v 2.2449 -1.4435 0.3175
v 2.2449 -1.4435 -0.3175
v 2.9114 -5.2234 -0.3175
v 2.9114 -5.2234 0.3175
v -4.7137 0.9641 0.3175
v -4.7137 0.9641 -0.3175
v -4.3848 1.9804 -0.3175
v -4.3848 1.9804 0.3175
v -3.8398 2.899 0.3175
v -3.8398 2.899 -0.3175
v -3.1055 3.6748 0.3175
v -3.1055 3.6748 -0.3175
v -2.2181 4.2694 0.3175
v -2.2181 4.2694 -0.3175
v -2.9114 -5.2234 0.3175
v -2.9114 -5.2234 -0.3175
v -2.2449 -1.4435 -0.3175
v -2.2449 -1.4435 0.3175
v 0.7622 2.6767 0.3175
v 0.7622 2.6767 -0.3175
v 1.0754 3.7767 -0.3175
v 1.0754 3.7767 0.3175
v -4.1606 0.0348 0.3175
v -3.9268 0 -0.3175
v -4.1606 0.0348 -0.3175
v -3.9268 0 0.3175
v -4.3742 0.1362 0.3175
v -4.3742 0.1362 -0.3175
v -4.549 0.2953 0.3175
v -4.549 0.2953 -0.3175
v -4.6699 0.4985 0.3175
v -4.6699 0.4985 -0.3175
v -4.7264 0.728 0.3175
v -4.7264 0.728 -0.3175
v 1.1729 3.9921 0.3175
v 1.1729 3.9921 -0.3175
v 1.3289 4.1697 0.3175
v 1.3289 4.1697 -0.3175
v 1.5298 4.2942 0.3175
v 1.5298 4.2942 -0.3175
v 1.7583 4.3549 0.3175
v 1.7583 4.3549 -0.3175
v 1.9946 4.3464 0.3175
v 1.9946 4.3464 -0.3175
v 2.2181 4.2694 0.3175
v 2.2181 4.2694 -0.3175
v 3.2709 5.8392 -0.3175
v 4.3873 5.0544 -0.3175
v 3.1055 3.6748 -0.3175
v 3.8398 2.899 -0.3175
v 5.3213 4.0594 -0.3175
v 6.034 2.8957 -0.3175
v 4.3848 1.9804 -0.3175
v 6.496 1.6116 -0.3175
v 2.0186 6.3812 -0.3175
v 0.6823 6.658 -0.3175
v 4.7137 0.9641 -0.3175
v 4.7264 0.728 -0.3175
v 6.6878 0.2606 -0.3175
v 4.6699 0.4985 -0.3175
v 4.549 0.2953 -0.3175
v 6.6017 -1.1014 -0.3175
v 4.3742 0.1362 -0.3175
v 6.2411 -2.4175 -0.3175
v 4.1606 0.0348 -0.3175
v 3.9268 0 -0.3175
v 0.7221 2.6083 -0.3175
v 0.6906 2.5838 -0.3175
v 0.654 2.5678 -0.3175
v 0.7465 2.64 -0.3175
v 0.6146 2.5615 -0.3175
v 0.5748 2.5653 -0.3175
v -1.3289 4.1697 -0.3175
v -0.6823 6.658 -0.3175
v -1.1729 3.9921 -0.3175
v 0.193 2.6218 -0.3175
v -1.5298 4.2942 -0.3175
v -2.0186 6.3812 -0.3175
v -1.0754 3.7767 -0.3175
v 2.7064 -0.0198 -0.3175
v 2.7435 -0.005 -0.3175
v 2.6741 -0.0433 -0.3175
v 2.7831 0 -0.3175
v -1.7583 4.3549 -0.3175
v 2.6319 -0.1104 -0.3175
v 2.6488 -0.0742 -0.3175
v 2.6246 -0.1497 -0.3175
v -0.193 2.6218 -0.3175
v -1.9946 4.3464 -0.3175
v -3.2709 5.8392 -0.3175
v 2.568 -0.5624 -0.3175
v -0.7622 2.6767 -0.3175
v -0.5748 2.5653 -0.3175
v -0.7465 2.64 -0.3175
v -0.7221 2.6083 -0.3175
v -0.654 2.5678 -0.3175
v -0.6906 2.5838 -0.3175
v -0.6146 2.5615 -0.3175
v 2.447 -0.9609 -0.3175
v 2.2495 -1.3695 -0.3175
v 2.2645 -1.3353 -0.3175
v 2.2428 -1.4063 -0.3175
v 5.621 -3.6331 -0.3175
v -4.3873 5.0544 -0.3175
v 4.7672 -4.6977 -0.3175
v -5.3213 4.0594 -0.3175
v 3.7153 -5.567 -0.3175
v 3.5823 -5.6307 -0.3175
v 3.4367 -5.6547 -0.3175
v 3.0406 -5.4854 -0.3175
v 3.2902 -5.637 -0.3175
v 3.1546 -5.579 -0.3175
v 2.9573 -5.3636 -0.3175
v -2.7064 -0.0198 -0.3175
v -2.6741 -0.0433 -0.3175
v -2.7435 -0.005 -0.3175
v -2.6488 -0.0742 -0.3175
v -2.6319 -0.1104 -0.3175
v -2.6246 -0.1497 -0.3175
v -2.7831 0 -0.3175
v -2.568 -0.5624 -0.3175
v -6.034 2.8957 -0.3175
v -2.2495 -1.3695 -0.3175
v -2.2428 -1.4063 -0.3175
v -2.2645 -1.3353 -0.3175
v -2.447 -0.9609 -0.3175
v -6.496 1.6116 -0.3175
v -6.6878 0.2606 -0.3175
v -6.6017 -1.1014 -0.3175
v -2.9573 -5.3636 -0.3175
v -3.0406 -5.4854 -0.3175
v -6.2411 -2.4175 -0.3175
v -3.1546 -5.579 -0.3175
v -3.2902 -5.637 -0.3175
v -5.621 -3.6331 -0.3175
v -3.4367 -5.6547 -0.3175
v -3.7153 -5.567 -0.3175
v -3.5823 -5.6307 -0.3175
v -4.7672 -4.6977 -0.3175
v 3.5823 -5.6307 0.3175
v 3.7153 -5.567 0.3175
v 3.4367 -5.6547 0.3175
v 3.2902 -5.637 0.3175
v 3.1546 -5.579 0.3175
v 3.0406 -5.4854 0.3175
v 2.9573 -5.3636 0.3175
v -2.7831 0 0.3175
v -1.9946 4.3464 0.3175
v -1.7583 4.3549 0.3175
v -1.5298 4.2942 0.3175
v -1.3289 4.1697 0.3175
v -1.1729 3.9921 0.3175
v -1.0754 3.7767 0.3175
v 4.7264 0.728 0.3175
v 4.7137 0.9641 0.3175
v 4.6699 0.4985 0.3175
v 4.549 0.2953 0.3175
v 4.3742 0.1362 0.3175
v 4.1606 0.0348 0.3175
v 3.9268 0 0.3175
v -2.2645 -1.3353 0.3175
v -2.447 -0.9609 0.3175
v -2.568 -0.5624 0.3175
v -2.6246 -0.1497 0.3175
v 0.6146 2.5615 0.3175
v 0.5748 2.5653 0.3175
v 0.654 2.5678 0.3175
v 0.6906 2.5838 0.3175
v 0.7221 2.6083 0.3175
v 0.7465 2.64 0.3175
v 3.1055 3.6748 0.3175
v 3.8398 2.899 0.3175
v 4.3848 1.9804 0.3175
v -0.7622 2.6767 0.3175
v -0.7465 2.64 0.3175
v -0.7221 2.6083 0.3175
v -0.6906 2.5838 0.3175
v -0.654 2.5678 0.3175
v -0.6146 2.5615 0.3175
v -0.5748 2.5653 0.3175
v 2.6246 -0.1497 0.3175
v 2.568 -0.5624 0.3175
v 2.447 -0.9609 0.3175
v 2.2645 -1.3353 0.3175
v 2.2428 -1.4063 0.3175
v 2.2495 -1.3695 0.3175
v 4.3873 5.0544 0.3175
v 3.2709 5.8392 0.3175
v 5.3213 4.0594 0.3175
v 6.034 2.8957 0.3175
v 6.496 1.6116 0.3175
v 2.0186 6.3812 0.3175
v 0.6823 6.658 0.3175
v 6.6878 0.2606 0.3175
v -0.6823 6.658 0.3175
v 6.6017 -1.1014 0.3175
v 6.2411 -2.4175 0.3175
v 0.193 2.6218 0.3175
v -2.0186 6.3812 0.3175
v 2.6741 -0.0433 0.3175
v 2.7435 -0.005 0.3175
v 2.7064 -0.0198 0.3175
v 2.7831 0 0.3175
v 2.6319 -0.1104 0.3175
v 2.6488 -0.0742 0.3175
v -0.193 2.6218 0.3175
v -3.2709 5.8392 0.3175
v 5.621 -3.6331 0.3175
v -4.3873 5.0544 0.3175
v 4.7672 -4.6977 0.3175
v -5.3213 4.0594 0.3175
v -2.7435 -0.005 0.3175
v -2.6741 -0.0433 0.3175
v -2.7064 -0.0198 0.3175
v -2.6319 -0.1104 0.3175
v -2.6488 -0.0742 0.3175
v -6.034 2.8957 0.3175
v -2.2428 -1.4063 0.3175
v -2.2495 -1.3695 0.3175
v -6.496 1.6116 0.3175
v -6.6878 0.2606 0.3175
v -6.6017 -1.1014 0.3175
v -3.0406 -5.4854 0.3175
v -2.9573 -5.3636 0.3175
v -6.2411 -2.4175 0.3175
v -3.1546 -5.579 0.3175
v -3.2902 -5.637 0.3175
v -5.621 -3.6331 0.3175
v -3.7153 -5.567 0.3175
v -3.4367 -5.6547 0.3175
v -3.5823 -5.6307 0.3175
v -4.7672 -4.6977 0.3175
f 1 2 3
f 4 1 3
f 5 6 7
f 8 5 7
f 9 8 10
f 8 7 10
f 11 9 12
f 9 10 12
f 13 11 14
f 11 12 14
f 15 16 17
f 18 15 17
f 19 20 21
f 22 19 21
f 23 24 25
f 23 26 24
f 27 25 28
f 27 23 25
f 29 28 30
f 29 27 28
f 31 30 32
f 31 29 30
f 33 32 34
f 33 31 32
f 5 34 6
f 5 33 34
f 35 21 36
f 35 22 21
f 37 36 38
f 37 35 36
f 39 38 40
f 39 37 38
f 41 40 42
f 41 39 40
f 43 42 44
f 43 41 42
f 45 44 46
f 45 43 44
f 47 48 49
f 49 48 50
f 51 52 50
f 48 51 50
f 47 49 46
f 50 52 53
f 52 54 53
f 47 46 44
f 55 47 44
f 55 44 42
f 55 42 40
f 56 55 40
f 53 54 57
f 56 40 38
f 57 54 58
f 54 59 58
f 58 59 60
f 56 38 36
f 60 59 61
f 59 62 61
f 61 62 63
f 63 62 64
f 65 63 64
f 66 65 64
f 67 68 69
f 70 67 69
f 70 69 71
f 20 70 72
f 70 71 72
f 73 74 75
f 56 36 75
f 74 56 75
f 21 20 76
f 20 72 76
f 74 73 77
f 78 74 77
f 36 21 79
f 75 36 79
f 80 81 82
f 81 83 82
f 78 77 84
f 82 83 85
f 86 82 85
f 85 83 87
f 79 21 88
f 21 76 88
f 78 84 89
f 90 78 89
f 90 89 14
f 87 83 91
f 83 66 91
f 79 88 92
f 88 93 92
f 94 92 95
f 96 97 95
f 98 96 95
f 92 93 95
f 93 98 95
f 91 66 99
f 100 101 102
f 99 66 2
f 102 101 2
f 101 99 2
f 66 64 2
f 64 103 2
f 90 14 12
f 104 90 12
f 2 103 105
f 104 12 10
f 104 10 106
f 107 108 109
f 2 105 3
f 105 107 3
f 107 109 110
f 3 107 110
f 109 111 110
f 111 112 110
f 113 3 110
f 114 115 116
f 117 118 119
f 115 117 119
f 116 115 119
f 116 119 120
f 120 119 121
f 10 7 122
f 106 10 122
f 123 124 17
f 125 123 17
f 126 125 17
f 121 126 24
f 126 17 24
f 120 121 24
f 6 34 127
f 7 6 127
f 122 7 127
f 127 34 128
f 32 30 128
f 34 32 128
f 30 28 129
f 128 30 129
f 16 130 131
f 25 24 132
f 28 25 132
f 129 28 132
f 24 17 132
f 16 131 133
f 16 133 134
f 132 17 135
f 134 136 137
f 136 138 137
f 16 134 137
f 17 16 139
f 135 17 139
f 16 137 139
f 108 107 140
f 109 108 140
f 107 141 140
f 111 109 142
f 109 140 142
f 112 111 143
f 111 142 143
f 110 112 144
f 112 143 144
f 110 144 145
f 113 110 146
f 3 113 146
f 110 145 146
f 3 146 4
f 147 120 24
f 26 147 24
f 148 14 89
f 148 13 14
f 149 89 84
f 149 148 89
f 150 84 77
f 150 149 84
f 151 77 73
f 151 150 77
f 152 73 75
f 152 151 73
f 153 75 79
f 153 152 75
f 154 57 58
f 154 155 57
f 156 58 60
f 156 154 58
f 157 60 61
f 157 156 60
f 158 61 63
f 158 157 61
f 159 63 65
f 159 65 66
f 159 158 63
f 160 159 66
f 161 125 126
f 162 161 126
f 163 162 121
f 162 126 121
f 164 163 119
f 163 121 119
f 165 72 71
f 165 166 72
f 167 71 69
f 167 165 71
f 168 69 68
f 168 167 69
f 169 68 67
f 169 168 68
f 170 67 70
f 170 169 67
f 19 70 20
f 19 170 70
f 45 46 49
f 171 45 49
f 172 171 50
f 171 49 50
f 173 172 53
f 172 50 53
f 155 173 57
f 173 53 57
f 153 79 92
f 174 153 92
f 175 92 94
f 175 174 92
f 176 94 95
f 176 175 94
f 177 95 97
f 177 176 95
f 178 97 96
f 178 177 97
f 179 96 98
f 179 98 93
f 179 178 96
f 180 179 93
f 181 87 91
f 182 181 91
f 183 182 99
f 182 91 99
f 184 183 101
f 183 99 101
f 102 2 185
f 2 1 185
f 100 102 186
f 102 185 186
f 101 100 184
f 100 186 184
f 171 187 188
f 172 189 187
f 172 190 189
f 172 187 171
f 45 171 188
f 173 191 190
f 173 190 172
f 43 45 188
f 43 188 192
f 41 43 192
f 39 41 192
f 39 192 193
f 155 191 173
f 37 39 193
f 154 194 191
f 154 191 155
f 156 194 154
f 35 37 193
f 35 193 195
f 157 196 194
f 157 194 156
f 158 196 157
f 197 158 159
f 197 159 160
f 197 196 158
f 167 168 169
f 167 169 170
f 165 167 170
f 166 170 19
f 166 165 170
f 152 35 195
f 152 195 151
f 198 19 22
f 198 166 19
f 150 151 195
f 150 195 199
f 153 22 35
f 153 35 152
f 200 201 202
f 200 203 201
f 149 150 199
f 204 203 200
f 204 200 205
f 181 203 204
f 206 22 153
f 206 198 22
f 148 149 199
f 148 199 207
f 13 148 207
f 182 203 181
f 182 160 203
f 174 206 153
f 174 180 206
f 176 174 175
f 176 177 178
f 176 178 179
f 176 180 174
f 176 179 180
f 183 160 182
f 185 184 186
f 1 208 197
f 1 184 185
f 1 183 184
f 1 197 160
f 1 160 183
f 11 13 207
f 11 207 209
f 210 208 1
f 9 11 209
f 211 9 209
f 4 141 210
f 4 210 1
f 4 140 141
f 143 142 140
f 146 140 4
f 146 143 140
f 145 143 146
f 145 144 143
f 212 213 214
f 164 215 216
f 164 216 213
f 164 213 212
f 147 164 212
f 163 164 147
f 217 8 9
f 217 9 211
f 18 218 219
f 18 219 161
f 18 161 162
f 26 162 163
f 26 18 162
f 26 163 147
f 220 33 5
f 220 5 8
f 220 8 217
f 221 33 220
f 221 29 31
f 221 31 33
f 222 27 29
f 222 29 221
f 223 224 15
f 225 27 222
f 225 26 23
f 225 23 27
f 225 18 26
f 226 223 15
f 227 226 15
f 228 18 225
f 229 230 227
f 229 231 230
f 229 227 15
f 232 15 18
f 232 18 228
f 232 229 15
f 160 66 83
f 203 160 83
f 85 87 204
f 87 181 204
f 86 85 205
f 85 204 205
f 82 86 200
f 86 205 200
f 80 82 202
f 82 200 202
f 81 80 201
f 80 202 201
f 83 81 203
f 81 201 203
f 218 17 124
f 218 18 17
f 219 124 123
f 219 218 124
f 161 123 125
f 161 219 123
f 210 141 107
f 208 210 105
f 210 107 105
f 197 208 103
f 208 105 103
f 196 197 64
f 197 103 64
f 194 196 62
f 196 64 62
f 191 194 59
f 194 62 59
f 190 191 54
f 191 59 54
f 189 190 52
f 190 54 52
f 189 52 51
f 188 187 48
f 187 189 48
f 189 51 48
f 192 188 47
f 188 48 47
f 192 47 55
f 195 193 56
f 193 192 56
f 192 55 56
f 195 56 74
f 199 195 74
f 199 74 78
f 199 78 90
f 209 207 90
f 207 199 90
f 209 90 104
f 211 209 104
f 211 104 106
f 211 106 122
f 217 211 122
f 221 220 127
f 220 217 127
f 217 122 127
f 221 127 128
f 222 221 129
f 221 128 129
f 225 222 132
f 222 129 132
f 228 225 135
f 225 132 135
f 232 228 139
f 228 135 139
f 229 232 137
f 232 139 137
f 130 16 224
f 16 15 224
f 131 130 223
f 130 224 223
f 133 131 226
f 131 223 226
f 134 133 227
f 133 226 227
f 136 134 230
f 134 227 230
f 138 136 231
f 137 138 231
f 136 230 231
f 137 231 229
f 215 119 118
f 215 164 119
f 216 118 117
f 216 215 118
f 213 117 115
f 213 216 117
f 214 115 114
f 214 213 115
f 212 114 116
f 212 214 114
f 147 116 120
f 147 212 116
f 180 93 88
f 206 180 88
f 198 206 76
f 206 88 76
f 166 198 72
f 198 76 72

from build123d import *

# Parameters (mm, degrees)
SKETCH3_W               = 6.6929
SKETCH3_H               = 0.635
CUT_EXTRUDE1_DEPTH      = 10.470513559
CUT_EXTRUDE1_DEPTH_BACK = 10.470513559
FILLET1_R               = 0.803148
FILLET2_R               = 0.5220462
FILLET3_R               = 0.15875


with BuildPart() as part:
    # Sketch3 → Revolve1 (revolve)
    with BuildSketch(Plane(origin=(0, 0, 0), x_dir=(1, 0, 0), z_dir=(0, 1, 0))):
        with Locations((-3.34645, 0)):
            Rectangle(SKETCH3_W, SKETCH3_H)
    revolve(axis=Axis((0, 0, -0.3175), (0, 0, 1)))

    # Sketch4 → Cut-Extrude1 (cut, two sides: drawn at the far end of the back side and taken through both)
    with BuildSketch(Plane.XY.offset(-CUT_EXTRUDE1_DEPTH_BACK)):
        with BuildLine():
            Line((0.719953916, 2.528395058), (1.317615519, 4.62731363))
            ThreePointArc((1.317615519, 4.62731363), (3.839760531, 2.89903107), (4.811251613, 0))
            Line((4.811251613, 0), (2.6289, 0))
            ThreePointArc((2.6289, 0), (2.528395058, -0.719953916), (2.234565, -1.384859008))
            Line((2.234565, -1.384859008), (3.041609986, -5.961838567))
            ThreePointArc((3.041609986, -5.961838567), (0, -6.6929), (-3.041609986, -5.961838567))
            Line((-3.041609986, -5.961838567), (-2.234565, -1.384859008))
            ThreePointArc((-2.234565, -1.384859008), (-2.528395058, -0.719953916), (-2.6289, 0))
            Line((-2.6289, 0), (-4.811251613, 0))
            ThreePointArc((-4.811251613, 0), (-3.839760531, 2.89903107), (-1.317615519, 4.62731363))
            Line((-1.317615519, 4.62731363), (-0.719953916, 2.528395058))
            ThreePointArc((-0.719953916, 2.528395058), (0, 2.6289), (0.719953916, 2.528395058))
        make_face()
    extrude(amount=CUT_EXTRUDE1_DEPTH + CUT_EXTRUDE1_DEPTH_BACK, mode=Mode.SUBTRACT)

    # Fillet1
    fillet1_edges = [part.edges().sort_by_distance(p)[0] for p in [
        (1.317615519, 4.62731363, 0),
        (4.811251613, 0, 0),
        (-4.811251613, 0, 0),
        (-1.317615519, 4.62731363, 0),
    ]]
    fillet(fillet1_edges, radius=FILLET1_R)

    # Fillet2
    fillet2_edges = [part.edges().sort_by_distance(p)[0] for p in [
        (3.041609986, -5.961838567, 0),
        (-3.041609986, -5.961838567, 0),
    ]]
    fillet(fillet2_edges, radius=FILLET2_R)

    # Fillet3
    fillet3_edges = [part.edges().sort_by_distance(p)[0] for p in [
        (-0.719953916, 2.528395058, 0),
        (0.719953916, 2.528395058, 0),
        (2.6289, 0, 0),
        (2.234565, -1.384859008, 0),
        (-2.234565, -1.384859008, 0),
        (-2.6289, 0, 0),
    ]]
    fillet(fillet3_edges, radius=FILLET3_R)


solid = part.part
